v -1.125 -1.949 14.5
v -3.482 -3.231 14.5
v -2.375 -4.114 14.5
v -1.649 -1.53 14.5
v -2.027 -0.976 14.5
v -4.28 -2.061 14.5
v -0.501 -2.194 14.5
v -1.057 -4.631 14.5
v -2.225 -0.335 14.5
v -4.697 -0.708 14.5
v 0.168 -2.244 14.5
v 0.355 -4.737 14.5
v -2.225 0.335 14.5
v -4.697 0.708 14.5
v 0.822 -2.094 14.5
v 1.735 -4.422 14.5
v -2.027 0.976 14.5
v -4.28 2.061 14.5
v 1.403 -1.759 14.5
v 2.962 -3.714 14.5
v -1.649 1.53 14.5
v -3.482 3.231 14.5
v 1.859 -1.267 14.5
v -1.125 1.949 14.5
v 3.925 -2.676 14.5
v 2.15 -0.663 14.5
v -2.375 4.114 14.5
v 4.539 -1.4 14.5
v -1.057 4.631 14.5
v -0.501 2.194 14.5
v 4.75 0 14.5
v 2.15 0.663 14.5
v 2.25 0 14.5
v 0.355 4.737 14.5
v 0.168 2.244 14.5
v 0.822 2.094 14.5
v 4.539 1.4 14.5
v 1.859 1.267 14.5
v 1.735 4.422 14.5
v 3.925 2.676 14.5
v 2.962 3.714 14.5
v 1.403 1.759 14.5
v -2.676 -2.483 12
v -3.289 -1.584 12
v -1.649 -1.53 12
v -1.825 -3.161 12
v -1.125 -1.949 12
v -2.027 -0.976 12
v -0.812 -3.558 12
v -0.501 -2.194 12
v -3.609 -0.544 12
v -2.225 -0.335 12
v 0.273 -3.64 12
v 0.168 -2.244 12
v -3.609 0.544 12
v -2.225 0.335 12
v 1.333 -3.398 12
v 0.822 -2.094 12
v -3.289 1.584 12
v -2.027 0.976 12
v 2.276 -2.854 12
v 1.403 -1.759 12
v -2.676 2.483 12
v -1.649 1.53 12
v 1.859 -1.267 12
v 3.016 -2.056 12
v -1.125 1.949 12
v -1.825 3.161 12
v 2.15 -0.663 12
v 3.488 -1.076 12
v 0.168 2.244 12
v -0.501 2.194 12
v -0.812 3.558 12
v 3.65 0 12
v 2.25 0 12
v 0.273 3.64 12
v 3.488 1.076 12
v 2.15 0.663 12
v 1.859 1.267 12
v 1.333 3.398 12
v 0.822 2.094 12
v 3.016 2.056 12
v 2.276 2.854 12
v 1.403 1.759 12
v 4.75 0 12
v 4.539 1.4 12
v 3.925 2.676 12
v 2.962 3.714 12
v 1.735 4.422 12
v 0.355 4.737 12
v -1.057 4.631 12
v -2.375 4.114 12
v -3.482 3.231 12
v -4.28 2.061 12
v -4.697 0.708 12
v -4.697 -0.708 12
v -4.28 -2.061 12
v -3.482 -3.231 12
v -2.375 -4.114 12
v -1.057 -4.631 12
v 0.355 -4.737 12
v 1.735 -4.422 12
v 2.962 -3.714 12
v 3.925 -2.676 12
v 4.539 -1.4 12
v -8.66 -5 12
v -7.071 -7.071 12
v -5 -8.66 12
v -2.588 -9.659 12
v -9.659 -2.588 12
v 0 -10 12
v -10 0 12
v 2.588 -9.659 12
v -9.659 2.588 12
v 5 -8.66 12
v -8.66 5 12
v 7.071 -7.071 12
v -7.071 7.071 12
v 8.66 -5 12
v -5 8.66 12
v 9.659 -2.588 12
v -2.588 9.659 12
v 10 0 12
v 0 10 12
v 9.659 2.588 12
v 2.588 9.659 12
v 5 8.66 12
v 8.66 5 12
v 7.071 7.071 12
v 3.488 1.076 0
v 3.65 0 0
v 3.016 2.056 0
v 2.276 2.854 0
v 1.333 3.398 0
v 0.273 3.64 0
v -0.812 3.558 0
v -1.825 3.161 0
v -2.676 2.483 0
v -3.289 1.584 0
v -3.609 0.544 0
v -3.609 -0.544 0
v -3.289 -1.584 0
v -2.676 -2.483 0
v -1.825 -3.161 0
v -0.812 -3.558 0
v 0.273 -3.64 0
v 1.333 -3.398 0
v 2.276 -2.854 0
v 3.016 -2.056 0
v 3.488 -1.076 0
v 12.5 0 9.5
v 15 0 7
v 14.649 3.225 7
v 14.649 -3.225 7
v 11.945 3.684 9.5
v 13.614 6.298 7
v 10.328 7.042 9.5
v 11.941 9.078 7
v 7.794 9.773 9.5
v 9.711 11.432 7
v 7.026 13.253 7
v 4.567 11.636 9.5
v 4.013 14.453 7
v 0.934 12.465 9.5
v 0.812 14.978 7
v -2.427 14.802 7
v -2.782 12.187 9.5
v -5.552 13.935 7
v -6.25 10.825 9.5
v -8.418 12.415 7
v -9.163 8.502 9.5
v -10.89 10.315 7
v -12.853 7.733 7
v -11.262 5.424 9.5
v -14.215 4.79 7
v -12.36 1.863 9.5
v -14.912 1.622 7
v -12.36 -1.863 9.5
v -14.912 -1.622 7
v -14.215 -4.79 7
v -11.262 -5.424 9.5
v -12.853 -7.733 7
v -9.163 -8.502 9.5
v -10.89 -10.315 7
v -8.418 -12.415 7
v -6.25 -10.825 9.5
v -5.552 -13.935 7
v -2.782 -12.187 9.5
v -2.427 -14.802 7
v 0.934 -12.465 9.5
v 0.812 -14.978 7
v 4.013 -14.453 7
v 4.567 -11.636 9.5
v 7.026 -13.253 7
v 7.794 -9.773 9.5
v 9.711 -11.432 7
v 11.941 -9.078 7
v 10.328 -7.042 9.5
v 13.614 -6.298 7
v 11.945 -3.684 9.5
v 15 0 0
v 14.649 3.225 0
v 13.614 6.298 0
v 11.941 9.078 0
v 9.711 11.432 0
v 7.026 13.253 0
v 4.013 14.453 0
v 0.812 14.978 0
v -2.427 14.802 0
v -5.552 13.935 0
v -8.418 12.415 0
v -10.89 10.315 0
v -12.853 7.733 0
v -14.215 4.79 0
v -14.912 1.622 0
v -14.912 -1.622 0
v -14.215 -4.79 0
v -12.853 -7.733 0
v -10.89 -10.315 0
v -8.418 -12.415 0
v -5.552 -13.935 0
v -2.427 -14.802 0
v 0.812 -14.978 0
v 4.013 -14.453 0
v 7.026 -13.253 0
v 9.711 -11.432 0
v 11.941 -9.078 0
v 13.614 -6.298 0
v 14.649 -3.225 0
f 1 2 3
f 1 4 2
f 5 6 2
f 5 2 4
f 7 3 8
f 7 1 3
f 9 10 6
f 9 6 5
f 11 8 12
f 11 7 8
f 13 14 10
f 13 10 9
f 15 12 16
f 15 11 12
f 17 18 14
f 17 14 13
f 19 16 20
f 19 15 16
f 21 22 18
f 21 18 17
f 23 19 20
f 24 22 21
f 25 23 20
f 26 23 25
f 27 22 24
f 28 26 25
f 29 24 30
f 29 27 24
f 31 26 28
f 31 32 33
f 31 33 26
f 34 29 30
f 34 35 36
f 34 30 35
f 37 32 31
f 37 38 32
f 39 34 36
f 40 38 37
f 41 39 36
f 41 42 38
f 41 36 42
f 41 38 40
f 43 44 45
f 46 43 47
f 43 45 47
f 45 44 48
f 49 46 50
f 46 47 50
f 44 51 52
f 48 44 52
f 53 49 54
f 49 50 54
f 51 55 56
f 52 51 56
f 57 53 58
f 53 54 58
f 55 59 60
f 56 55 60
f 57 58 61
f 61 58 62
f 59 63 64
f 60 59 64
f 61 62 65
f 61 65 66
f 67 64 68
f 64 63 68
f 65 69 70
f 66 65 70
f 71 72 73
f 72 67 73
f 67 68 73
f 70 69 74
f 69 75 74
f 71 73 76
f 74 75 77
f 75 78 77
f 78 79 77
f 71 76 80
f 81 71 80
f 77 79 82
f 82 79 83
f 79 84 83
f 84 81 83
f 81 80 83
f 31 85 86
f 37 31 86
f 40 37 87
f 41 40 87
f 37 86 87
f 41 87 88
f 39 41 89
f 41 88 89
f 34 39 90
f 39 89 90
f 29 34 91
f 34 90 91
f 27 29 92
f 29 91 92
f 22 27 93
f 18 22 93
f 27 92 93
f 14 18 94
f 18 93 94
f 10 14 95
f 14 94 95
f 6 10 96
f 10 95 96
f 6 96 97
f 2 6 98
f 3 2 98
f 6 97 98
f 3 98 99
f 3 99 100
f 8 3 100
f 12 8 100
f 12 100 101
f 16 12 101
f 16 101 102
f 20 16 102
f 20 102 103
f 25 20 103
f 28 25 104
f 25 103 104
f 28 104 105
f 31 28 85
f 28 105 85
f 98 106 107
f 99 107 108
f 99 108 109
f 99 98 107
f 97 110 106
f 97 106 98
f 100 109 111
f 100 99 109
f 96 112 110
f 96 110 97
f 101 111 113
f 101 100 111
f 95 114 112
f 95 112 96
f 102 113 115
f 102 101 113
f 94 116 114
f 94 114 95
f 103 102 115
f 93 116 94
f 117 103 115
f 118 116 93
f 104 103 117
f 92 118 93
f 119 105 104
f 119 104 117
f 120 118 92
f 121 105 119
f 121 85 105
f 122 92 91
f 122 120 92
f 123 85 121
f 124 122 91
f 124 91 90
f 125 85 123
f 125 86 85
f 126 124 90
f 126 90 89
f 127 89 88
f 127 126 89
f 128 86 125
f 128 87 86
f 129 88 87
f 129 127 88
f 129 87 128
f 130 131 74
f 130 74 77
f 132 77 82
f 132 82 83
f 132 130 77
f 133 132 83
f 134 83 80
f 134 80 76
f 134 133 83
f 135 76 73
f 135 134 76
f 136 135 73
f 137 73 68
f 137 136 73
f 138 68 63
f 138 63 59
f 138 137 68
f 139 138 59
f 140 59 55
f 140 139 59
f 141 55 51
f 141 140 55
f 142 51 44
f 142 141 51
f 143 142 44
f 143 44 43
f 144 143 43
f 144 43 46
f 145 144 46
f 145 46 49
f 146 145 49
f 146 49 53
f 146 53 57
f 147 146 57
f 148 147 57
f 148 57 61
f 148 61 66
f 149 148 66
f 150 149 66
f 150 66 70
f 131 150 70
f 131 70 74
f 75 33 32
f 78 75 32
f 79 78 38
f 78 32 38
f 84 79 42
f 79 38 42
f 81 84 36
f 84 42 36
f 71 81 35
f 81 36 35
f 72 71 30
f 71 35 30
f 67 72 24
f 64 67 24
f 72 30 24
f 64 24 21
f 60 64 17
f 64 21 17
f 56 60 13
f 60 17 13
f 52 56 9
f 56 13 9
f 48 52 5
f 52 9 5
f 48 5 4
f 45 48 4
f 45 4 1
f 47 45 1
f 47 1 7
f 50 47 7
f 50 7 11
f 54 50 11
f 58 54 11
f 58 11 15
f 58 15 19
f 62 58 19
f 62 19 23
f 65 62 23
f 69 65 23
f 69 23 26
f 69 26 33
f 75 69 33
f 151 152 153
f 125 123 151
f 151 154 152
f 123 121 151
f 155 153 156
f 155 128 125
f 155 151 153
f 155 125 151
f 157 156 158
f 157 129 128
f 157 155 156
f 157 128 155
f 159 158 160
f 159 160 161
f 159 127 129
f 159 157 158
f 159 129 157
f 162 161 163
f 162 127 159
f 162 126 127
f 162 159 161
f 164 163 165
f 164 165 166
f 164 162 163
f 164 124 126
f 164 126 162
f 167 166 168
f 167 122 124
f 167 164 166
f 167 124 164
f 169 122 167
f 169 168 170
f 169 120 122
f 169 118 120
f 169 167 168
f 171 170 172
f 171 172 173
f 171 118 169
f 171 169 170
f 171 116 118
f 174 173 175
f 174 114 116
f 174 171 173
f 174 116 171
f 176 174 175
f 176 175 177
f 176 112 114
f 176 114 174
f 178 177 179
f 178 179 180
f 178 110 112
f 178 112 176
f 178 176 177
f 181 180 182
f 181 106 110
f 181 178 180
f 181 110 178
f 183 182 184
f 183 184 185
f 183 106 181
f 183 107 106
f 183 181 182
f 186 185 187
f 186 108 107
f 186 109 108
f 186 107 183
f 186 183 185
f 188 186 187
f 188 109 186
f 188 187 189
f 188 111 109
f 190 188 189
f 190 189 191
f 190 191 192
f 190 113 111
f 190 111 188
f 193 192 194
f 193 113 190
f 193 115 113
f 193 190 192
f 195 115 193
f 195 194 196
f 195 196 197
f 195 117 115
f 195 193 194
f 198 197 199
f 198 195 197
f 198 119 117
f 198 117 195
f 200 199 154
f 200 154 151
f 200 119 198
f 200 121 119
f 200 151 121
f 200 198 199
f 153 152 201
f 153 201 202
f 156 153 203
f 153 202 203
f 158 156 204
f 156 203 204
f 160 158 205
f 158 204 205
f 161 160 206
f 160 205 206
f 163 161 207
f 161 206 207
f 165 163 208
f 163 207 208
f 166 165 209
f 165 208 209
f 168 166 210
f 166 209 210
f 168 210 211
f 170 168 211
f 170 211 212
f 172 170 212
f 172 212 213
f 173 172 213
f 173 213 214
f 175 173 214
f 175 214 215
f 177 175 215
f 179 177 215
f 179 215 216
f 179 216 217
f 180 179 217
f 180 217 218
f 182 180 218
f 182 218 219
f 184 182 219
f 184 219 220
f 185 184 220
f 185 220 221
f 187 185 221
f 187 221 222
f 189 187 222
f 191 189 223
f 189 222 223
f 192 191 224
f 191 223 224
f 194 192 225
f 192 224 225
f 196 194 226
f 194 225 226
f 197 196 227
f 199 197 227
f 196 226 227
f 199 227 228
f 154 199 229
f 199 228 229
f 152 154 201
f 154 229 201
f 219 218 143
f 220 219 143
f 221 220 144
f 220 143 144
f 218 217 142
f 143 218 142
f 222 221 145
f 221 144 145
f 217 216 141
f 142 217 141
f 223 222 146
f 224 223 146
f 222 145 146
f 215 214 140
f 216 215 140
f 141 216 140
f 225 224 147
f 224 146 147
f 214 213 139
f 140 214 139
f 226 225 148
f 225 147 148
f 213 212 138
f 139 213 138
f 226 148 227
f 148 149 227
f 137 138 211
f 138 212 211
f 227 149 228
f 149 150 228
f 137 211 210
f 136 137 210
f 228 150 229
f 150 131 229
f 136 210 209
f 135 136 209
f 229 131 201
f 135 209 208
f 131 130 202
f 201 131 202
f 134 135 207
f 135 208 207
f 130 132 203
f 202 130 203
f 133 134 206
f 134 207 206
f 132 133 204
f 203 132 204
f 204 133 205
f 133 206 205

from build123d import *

# Parameters (mm, degrees)
F0_R     = 15
F0_R_2   = 3.65
F1_DEPTH = 8
F2_R     = 15
F3_DEPTH = 4
F4_SIZE  = 5
F5_R     = 4.75
F6_DEPTH = 2.5
F7_R     = 2.25
F8_DEPTH = 5
F9_DEPTH = 12


with BuildPart() as f1:
    # F0 (on Top) → F1 (new body)
    with BuildSketch(Plane.XY):
        Circle(F0_R)
        Circle(F0_R_2, mode=Mode.SUBTRACT)
    extrude(amount=F1_DEPTH)

    # F2 (on face) → F3 (join)
    with BuildSketch(Plane.XY.offset(8)):
        Circle(F2_R)
    extrude(amount=F3_DEPTH)

    # F4
    f4_edges = [f1.edges().sort_by_distance(p)[0] for p in [
        (-15, 0, 12),
    ]]
    chamfer(f4_edges, length=F4_SIZE)

    # F5 (on face) → F6 (join)
    with BuildSketch(Plane.XY.offset(12)):
        Circle(F5_R)
    extrude(amount=F6_DEPTH)

    # F7 (on face) → F8 (cut)
    with BuildSketch(Plane.XY.offset(14.5)):
        Circle(F7_R)
    extrude(amount=-F8_DEPTH, mode=Mode.SUBTRACT)

    # F0 (on Top) → F9 (cut)
    with BuildSketch(Plane.XY):
        Circle(F0_R_2)
    extrude(amount=F9_DEPTH, mode=Mode.SUBTRACT)


solid = f1.part
